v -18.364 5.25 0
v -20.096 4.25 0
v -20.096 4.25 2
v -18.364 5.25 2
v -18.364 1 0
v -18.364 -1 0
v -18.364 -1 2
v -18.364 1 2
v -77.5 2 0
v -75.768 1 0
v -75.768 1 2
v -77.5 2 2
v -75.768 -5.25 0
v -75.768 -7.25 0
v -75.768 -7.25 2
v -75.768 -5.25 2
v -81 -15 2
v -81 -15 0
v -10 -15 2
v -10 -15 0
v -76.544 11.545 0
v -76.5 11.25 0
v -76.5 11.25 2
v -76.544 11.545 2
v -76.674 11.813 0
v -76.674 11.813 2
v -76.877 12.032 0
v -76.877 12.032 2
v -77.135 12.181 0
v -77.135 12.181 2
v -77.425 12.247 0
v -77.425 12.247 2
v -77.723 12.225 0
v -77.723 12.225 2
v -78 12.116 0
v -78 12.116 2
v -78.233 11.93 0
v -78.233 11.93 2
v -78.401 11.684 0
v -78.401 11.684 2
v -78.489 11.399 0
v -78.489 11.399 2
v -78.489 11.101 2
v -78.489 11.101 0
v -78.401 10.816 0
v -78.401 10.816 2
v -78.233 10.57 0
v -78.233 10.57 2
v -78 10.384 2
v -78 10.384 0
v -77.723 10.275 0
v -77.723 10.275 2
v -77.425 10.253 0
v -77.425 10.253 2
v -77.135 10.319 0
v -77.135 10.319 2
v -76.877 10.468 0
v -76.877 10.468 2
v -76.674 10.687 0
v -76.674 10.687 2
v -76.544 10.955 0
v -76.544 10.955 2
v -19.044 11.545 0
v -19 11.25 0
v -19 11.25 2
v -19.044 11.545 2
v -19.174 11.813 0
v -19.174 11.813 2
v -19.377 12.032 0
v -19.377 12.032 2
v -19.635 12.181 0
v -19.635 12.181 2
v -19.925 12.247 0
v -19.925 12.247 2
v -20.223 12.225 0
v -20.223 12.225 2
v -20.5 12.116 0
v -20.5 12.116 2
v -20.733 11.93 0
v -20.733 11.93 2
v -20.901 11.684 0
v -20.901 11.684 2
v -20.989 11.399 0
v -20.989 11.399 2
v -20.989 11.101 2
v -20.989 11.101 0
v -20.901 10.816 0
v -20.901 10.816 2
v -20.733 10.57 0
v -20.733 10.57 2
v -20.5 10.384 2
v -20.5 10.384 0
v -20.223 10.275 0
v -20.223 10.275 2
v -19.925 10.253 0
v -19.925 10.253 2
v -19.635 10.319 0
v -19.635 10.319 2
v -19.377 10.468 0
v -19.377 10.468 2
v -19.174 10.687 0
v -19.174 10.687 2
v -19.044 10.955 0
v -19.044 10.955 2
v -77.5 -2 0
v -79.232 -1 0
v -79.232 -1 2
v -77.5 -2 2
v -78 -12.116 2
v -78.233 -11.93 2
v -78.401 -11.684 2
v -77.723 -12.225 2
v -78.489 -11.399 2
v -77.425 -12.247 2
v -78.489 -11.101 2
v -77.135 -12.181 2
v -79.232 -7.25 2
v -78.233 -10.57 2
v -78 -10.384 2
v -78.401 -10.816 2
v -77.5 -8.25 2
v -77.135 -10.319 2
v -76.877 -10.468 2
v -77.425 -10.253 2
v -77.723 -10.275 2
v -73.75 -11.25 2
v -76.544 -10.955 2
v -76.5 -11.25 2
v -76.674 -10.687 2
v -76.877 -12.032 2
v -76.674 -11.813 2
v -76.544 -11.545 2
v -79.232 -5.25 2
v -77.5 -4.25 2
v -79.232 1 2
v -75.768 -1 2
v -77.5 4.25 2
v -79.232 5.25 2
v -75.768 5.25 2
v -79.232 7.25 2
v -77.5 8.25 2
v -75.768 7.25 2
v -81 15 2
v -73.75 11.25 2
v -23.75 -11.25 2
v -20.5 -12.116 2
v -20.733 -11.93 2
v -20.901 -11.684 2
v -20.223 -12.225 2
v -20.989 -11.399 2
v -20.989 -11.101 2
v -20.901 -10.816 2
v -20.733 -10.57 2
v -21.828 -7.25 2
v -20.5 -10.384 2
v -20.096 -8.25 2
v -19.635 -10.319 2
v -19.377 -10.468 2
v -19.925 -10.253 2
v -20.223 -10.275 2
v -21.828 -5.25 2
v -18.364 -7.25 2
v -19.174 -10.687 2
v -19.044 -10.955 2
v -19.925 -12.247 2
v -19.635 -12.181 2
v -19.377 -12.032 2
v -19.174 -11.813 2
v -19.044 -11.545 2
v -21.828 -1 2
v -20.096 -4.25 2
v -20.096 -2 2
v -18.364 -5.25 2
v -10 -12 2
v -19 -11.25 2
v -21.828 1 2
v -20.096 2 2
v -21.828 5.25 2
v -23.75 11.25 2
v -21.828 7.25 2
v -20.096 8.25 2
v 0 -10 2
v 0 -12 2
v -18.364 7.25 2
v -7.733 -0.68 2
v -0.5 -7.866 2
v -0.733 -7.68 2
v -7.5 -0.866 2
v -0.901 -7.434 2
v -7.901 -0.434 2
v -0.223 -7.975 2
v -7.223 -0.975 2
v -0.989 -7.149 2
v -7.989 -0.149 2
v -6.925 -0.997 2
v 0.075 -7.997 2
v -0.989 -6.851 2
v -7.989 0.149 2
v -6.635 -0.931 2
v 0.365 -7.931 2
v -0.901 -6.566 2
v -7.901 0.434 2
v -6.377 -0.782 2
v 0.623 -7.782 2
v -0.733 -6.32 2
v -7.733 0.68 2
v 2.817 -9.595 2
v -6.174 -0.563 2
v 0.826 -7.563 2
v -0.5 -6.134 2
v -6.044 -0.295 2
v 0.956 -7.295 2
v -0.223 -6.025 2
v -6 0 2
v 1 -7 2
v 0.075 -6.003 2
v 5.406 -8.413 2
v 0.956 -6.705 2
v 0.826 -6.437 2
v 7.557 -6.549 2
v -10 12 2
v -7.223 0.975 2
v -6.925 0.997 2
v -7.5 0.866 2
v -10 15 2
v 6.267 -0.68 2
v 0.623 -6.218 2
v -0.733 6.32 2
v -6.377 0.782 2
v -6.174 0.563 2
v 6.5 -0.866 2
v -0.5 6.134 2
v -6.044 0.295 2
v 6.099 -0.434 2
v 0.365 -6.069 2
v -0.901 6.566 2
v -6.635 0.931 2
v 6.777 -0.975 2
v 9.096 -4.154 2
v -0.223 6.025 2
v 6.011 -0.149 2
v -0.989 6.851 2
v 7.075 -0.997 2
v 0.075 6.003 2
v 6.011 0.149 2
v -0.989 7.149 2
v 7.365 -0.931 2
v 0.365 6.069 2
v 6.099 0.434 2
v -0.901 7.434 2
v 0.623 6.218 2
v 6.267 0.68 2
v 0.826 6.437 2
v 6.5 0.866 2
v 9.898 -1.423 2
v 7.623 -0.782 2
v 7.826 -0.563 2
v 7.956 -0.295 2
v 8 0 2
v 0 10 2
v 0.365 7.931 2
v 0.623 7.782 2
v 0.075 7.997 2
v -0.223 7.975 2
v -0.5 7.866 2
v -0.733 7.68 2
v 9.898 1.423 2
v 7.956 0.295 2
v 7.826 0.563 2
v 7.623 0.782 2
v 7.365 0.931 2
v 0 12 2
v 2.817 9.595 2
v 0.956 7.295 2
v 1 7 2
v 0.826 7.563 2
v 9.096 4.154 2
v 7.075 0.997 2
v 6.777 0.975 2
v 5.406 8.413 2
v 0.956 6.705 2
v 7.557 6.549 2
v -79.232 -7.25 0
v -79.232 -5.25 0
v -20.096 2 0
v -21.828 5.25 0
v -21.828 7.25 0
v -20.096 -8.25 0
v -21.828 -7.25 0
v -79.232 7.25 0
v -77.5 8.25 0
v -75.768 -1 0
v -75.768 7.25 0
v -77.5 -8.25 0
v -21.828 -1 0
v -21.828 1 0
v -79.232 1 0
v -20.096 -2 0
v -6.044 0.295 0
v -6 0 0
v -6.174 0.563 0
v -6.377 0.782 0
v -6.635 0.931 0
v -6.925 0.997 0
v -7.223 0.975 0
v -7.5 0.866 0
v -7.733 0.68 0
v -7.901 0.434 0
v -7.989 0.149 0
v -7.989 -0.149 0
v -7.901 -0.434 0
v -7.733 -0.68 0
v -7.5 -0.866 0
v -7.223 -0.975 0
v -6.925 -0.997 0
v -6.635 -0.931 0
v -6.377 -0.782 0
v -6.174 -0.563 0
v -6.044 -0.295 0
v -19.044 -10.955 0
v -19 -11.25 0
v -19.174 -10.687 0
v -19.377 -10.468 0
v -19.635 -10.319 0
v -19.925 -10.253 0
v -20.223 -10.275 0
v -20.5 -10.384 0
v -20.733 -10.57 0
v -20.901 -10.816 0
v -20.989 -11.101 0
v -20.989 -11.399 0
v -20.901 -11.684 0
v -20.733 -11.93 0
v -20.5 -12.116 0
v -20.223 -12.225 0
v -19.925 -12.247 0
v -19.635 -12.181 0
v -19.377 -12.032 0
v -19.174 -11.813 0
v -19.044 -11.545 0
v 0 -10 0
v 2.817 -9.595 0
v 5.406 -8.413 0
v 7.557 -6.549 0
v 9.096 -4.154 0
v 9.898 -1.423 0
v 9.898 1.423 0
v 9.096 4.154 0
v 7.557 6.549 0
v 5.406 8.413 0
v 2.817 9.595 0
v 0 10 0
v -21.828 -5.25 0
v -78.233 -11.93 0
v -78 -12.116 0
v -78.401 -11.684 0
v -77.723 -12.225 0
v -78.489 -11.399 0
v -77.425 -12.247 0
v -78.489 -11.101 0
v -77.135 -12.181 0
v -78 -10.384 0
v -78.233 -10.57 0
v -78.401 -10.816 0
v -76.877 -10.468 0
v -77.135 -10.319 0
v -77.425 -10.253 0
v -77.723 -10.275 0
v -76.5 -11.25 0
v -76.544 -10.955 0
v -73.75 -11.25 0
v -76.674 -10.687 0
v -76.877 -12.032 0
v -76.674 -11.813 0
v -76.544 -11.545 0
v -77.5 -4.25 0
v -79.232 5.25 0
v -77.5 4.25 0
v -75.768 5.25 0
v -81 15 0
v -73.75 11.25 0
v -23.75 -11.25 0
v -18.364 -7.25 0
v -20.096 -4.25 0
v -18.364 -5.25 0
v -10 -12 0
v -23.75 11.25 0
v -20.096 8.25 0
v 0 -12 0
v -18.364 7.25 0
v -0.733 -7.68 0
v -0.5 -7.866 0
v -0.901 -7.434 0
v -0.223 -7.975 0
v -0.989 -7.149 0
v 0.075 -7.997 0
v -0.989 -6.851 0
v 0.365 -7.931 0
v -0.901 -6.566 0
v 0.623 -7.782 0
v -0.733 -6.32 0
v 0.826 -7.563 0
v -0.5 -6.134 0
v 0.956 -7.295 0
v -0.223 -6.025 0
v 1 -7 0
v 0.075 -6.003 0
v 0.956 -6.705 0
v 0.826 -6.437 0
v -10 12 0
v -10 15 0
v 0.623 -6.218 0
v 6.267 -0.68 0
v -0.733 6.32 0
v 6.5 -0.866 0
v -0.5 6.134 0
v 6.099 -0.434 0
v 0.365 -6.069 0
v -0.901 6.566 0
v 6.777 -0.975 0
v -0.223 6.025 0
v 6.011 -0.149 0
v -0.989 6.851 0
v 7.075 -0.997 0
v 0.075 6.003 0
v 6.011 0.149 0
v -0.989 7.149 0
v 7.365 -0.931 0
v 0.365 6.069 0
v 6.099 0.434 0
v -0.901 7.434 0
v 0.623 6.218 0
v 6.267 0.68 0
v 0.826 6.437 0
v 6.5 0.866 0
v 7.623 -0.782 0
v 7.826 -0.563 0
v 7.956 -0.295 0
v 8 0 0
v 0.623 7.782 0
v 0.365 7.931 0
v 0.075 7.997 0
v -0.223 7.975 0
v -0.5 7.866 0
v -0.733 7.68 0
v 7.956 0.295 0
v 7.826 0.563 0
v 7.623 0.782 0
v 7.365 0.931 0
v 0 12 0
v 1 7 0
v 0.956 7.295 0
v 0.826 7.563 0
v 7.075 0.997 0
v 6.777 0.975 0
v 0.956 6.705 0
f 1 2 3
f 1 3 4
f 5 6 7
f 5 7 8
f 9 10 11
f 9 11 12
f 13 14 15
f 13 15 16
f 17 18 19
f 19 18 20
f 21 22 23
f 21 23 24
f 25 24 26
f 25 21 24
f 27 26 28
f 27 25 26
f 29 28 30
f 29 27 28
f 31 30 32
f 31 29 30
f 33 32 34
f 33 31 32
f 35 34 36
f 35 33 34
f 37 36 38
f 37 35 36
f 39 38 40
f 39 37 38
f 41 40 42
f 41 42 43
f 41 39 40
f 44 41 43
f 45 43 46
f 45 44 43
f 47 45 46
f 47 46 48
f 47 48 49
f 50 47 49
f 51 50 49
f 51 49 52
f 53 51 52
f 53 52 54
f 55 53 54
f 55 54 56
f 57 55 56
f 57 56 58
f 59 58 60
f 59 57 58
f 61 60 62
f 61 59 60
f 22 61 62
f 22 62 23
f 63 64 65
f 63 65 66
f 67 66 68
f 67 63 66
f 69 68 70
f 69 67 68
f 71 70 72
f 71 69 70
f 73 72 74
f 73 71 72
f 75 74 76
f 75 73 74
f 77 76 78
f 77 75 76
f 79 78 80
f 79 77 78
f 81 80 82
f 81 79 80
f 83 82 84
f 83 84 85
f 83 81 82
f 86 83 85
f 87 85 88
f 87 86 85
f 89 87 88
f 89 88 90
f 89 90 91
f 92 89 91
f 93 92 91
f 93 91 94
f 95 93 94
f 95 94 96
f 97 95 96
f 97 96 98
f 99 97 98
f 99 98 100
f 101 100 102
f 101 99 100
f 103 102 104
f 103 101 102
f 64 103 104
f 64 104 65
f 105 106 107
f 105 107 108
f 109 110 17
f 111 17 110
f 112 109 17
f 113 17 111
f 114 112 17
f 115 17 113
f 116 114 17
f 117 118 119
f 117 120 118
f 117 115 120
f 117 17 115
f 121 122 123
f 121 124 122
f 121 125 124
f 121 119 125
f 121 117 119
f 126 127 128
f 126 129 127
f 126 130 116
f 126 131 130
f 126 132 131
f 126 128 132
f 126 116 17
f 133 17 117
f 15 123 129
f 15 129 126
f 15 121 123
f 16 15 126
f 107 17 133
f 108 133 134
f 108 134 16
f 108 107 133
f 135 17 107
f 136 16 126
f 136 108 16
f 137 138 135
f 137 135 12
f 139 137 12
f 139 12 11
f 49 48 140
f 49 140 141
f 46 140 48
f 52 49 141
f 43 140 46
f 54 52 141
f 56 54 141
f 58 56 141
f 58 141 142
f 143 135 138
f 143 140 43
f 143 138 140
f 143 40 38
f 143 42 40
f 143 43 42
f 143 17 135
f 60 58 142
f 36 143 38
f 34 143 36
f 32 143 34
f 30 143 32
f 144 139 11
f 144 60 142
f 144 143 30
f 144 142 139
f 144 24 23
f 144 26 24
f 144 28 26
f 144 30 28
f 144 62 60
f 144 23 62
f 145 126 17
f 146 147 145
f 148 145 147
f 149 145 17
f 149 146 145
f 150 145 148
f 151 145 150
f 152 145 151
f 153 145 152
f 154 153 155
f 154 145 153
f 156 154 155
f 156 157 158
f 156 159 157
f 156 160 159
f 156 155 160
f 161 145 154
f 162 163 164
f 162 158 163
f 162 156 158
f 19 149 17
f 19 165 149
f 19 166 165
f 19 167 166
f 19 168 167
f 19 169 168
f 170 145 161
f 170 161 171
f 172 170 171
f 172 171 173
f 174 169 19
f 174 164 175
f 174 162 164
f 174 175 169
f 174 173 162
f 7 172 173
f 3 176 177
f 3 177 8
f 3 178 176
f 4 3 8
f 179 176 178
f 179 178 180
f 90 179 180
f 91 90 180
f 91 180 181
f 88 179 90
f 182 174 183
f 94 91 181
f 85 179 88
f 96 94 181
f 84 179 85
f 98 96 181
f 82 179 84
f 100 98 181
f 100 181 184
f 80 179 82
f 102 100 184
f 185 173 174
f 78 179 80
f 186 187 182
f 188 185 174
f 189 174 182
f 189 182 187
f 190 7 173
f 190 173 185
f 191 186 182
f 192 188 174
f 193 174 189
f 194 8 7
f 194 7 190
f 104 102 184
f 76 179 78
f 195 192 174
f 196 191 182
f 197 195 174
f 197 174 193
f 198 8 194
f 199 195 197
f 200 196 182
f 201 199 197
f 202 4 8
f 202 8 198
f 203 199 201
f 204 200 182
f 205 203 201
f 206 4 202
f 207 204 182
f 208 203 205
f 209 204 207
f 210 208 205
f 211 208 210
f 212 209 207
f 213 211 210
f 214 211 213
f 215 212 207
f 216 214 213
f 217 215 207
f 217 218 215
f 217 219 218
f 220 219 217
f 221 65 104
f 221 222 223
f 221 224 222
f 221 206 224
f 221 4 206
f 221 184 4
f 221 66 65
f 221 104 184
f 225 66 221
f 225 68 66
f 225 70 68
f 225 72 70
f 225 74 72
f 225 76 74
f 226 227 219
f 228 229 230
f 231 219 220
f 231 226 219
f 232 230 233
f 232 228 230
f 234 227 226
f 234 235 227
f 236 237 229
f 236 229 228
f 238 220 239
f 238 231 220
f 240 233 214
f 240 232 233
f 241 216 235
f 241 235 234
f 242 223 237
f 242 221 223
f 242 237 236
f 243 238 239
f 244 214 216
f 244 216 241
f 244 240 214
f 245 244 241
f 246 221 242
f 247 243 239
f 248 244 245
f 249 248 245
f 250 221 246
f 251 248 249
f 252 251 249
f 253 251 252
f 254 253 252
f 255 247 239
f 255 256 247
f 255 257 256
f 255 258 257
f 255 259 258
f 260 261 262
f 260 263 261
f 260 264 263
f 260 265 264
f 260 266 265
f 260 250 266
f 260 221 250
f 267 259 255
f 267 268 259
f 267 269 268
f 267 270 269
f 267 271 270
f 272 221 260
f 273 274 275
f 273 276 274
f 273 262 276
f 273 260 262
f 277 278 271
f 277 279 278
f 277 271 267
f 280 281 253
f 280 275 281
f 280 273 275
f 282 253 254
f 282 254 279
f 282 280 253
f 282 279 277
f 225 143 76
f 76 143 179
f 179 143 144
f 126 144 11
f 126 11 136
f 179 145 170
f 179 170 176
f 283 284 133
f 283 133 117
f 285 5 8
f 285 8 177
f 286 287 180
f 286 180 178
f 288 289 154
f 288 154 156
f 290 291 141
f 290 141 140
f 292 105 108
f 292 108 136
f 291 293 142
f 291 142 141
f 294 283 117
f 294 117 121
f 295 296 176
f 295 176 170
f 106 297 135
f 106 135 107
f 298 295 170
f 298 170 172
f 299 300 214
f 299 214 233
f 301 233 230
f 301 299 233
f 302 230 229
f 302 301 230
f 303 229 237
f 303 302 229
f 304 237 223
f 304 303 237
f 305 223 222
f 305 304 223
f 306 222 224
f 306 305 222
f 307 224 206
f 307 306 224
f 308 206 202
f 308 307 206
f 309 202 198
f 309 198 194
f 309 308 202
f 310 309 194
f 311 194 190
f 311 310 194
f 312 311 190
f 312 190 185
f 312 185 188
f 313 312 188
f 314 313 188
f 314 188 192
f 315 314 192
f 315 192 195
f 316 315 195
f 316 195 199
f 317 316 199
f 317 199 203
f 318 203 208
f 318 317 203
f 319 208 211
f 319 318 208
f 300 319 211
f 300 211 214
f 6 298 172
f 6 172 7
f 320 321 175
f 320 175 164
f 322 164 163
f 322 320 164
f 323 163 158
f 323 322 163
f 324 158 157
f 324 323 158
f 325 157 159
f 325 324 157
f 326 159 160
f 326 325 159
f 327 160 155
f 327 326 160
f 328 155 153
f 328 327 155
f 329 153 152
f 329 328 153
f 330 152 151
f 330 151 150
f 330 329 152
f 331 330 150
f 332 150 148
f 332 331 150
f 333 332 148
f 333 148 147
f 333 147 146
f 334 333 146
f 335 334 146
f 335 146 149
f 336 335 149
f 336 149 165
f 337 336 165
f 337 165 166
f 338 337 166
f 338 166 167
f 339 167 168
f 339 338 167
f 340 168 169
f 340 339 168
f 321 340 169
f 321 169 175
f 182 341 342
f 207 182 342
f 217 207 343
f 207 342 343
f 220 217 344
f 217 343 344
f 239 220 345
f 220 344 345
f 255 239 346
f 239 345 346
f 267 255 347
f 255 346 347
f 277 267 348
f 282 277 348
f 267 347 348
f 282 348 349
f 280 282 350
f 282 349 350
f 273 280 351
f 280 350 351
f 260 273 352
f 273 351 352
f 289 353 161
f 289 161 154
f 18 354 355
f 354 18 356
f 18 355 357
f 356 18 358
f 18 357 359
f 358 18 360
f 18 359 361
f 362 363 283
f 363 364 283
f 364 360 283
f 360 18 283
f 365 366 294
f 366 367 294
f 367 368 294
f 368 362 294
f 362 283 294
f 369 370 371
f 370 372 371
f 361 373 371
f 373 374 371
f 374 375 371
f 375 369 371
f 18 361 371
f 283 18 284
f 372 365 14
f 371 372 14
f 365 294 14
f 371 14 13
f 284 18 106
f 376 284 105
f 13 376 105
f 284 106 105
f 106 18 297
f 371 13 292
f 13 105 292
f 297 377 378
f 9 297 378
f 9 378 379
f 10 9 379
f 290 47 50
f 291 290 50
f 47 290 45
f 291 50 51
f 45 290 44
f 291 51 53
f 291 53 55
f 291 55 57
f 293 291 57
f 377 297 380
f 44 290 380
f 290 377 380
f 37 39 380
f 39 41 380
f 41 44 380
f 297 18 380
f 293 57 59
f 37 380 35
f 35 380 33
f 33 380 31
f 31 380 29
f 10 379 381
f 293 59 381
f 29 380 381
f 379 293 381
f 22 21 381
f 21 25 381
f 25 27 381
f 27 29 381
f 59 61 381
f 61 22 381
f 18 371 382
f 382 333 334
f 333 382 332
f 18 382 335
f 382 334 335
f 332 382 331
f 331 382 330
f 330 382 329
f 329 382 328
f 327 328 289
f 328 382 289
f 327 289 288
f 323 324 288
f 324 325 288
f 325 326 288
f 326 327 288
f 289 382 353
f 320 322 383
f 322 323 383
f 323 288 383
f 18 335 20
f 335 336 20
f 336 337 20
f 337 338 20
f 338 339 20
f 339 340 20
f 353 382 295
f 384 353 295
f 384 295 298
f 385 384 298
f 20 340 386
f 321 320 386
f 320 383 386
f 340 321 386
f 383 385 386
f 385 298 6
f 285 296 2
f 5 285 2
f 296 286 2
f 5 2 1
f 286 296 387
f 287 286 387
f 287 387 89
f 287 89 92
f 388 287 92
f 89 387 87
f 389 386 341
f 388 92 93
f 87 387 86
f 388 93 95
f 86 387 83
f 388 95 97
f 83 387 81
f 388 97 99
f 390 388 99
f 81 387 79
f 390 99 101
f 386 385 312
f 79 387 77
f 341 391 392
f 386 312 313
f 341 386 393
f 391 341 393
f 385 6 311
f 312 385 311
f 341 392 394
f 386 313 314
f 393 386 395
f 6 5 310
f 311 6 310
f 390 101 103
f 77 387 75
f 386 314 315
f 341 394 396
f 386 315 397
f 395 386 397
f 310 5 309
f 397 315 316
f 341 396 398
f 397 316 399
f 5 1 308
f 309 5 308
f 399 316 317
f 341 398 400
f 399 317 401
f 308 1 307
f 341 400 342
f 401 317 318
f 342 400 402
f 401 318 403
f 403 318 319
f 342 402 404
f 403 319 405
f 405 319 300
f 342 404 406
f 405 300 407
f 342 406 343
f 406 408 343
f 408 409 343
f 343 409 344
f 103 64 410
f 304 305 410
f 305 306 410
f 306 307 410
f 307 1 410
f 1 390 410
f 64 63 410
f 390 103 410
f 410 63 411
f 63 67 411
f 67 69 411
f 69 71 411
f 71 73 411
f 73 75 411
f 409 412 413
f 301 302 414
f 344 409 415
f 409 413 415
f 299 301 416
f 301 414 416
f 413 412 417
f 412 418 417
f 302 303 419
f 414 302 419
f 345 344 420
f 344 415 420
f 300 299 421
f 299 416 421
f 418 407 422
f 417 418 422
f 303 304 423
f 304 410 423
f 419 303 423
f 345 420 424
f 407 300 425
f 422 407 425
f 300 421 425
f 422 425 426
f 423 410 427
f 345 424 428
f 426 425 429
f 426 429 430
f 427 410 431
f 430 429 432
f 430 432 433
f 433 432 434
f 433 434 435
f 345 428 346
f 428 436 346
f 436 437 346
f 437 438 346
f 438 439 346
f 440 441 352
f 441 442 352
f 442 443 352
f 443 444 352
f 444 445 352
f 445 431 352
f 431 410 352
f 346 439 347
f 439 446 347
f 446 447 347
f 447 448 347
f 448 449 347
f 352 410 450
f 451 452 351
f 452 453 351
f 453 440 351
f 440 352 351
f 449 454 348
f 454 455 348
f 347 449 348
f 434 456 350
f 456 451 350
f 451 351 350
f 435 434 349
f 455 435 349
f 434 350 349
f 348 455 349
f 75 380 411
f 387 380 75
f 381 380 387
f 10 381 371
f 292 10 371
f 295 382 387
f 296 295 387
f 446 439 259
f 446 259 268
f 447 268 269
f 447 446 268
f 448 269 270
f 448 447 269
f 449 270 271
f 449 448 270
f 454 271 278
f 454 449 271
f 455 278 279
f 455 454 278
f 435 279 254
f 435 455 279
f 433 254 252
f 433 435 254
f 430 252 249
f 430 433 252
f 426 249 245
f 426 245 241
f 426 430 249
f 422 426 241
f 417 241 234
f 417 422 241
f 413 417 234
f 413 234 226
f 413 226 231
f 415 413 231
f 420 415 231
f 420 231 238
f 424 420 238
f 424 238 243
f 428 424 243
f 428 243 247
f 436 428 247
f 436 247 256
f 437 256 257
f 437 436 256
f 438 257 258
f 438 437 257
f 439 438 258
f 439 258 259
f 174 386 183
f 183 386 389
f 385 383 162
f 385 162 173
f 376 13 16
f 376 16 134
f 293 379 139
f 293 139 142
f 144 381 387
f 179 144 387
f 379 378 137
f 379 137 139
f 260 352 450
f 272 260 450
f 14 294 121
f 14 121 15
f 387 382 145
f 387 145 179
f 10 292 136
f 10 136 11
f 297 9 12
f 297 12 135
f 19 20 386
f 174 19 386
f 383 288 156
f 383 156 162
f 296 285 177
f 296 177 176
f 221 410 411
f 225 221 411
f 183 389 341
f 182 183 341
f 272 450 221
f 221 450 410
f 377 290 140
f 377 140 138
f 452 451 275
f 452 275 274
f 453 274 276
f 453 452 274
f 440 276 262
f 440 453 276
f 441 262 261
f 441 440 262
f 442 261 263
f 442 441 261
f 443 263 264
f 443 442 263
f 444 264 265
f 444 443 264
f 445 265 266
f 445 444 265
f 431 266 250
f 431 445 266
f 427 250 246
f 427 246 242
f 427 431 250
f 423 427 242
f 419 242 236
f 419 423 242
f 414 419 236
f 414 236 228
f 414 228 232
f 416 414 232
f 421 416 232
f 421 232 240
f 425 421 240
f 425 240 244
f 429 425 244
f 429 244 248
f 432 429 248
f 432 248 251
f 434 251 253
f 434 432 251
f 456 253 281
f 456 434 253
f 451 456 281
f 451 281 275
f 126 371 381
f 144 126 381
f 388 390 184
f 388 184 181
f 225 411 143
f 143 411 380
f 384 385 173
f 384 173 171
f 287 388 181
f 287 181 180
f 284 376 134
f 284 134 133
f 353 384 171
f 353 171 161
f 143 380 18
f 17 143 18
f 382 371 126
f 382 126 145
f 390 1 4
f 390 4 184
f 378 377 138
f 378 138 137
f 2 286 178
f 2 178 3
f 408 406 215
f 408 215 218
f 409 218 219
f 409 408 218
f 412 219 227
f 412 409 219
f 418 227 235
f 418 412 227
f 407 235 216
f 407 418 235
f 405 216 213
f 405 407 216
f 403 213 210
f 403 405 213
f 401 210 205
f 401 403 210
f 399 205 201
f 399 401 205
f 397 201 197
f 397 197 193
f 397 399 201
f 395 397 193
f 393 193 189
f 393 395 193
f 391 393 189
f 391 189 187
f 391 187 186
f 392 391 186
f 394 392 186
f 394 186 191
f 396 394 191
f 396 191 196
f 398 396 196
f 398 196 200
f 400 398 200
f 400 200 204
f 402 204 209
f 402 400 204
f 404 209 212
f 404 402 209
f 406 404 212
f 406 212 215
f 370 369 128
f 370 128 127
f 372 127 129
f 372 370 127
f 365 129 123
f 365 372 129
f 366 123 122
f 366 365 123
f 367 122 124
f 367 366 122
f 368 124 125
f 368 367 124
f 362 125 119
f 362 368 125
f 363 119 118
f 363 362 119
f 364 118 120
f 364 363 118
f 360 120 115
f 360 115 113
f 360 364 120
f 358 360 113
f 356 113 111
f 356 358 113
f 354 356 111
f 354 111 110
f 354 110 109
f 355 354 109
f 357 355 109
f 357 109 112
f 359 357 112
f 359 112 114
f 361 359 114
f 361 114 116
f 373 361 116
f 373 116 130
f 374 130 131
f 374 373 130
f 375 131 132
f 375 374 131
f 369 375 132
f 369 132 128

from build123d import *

# Parameters (mm, degrees)
SKETCH1_R           = 1
SKETCH1_W           = 50
SKETCH1_H           = 22.5
BOSS_EXTRUDE1_DEPTH = 2


with BuildPart() as part:
    # Sketch1 → Boss-Extrude1 (new body)
    with BuildSketch(Plane.XY):
        with BuildLine():
            Line((0, 10), (0, 12))
            Line((0, 12), (-10, 12))
            Line((-10, 12), (-10, 15))
            Line((-10, 15), (-81, 15))
            Line((-81, 15), (-81, -15))
            Line((-81, -15), (-10, -15))
            Line((-10, -15), (-10, -12))
            Line((-10, -12), (0, -12))
            Line((0, -12), (0, -10))
            ThreePointArc((0, -10), (10, 0), (0, 10))
        make_face()
        with Locations((0, 7)):
            Circle(SKETCH1_R, mode=Mode.SUBTRACT)
        with Locations((7, 0)):
            Circle(SKETCH1_R, mode=Mode.SUBTRACT)
        with Locations((0, -7)):
            Circle(SKETCH1_R, mode=Mode.SUBTRACT)
        with Locations((-7, 0)):
            Circle(SKETCH1_R, mode=Mode.SUBTRACT)
        with Locations((-20, 11.25)):
            Circle(SKETCH1_R, mode=Mode.SUBTRACT)
        with Locations((-20, -11.25)):
            Circle(SKETCH1_R, mode=Mode.SUBTRACT)
        with Locations((-77.5, 11.25)):
            Circle(SKETCH1_R, mode=Mode.SUBTRACT)
        with Locations((-77.5, -11.25)):
            Circle(SKETCH1_R, mode=Mode.SUBTRACT)
        with Locations((-48.75, 0)):
            Rectangle(SKETCH1_W, SKETCH1_H, mode=Mode.SUBTRACT)
        Polygon((-20.096394859, 8.25), (-21.828445667, 7.25), (-21.828445667, 5.25), (-20.096394859, 4.25), (-18.364344051, 5.25), (-18.364344051, 7.25), align=None, mode=Mode.SUBTRACT)
        Polygon((-20.096394859, -8.25), (-18.364344051, -7.25), (-18.364344051, -5.25), (-20.096394859, -4.25), (-21.828445667, -5.25), (-21.828445667, -7.25), align=None, mode=Mode.SUBTRACT)
        Polygon((-20.096394859, -2), (-18.364344051, -1), (-18.364344051, 1), (-20.096394859, 2), (-21.828445667, 1), (-21.828445667, -1), align=None, mode=Mode.SUBTRACT)
        Polygon((-77.5, 4.25), (-75.767949192, 5.25), (-75.767949192, 7.25), (-77.5, 8.25), (-79.232050808, 7.25), (-79.232050808, 5.25), align=None, mode=Mode.SUBTRACT)
        Polygon((-77.5, -8.25), (-75.767949192, -7.25), (-75.767949192, -5.25), (-77.5, -4.25), (-79.232050808, -5.25), (-79.232050808, -7.25), align=None, mode=Mode.SUBTRACT)
        Polygon((-77.5, -2), (-75.767949192, -1), (-75.767949192, 1), (-77.5, 2), (-79.232050808, 1), (-79.232050808, -1), align=None, mode=Mode.SUBTRACT)
    extrude(amount=BOSS_EXTRUDE1_DEPTH)


solid = part.part
